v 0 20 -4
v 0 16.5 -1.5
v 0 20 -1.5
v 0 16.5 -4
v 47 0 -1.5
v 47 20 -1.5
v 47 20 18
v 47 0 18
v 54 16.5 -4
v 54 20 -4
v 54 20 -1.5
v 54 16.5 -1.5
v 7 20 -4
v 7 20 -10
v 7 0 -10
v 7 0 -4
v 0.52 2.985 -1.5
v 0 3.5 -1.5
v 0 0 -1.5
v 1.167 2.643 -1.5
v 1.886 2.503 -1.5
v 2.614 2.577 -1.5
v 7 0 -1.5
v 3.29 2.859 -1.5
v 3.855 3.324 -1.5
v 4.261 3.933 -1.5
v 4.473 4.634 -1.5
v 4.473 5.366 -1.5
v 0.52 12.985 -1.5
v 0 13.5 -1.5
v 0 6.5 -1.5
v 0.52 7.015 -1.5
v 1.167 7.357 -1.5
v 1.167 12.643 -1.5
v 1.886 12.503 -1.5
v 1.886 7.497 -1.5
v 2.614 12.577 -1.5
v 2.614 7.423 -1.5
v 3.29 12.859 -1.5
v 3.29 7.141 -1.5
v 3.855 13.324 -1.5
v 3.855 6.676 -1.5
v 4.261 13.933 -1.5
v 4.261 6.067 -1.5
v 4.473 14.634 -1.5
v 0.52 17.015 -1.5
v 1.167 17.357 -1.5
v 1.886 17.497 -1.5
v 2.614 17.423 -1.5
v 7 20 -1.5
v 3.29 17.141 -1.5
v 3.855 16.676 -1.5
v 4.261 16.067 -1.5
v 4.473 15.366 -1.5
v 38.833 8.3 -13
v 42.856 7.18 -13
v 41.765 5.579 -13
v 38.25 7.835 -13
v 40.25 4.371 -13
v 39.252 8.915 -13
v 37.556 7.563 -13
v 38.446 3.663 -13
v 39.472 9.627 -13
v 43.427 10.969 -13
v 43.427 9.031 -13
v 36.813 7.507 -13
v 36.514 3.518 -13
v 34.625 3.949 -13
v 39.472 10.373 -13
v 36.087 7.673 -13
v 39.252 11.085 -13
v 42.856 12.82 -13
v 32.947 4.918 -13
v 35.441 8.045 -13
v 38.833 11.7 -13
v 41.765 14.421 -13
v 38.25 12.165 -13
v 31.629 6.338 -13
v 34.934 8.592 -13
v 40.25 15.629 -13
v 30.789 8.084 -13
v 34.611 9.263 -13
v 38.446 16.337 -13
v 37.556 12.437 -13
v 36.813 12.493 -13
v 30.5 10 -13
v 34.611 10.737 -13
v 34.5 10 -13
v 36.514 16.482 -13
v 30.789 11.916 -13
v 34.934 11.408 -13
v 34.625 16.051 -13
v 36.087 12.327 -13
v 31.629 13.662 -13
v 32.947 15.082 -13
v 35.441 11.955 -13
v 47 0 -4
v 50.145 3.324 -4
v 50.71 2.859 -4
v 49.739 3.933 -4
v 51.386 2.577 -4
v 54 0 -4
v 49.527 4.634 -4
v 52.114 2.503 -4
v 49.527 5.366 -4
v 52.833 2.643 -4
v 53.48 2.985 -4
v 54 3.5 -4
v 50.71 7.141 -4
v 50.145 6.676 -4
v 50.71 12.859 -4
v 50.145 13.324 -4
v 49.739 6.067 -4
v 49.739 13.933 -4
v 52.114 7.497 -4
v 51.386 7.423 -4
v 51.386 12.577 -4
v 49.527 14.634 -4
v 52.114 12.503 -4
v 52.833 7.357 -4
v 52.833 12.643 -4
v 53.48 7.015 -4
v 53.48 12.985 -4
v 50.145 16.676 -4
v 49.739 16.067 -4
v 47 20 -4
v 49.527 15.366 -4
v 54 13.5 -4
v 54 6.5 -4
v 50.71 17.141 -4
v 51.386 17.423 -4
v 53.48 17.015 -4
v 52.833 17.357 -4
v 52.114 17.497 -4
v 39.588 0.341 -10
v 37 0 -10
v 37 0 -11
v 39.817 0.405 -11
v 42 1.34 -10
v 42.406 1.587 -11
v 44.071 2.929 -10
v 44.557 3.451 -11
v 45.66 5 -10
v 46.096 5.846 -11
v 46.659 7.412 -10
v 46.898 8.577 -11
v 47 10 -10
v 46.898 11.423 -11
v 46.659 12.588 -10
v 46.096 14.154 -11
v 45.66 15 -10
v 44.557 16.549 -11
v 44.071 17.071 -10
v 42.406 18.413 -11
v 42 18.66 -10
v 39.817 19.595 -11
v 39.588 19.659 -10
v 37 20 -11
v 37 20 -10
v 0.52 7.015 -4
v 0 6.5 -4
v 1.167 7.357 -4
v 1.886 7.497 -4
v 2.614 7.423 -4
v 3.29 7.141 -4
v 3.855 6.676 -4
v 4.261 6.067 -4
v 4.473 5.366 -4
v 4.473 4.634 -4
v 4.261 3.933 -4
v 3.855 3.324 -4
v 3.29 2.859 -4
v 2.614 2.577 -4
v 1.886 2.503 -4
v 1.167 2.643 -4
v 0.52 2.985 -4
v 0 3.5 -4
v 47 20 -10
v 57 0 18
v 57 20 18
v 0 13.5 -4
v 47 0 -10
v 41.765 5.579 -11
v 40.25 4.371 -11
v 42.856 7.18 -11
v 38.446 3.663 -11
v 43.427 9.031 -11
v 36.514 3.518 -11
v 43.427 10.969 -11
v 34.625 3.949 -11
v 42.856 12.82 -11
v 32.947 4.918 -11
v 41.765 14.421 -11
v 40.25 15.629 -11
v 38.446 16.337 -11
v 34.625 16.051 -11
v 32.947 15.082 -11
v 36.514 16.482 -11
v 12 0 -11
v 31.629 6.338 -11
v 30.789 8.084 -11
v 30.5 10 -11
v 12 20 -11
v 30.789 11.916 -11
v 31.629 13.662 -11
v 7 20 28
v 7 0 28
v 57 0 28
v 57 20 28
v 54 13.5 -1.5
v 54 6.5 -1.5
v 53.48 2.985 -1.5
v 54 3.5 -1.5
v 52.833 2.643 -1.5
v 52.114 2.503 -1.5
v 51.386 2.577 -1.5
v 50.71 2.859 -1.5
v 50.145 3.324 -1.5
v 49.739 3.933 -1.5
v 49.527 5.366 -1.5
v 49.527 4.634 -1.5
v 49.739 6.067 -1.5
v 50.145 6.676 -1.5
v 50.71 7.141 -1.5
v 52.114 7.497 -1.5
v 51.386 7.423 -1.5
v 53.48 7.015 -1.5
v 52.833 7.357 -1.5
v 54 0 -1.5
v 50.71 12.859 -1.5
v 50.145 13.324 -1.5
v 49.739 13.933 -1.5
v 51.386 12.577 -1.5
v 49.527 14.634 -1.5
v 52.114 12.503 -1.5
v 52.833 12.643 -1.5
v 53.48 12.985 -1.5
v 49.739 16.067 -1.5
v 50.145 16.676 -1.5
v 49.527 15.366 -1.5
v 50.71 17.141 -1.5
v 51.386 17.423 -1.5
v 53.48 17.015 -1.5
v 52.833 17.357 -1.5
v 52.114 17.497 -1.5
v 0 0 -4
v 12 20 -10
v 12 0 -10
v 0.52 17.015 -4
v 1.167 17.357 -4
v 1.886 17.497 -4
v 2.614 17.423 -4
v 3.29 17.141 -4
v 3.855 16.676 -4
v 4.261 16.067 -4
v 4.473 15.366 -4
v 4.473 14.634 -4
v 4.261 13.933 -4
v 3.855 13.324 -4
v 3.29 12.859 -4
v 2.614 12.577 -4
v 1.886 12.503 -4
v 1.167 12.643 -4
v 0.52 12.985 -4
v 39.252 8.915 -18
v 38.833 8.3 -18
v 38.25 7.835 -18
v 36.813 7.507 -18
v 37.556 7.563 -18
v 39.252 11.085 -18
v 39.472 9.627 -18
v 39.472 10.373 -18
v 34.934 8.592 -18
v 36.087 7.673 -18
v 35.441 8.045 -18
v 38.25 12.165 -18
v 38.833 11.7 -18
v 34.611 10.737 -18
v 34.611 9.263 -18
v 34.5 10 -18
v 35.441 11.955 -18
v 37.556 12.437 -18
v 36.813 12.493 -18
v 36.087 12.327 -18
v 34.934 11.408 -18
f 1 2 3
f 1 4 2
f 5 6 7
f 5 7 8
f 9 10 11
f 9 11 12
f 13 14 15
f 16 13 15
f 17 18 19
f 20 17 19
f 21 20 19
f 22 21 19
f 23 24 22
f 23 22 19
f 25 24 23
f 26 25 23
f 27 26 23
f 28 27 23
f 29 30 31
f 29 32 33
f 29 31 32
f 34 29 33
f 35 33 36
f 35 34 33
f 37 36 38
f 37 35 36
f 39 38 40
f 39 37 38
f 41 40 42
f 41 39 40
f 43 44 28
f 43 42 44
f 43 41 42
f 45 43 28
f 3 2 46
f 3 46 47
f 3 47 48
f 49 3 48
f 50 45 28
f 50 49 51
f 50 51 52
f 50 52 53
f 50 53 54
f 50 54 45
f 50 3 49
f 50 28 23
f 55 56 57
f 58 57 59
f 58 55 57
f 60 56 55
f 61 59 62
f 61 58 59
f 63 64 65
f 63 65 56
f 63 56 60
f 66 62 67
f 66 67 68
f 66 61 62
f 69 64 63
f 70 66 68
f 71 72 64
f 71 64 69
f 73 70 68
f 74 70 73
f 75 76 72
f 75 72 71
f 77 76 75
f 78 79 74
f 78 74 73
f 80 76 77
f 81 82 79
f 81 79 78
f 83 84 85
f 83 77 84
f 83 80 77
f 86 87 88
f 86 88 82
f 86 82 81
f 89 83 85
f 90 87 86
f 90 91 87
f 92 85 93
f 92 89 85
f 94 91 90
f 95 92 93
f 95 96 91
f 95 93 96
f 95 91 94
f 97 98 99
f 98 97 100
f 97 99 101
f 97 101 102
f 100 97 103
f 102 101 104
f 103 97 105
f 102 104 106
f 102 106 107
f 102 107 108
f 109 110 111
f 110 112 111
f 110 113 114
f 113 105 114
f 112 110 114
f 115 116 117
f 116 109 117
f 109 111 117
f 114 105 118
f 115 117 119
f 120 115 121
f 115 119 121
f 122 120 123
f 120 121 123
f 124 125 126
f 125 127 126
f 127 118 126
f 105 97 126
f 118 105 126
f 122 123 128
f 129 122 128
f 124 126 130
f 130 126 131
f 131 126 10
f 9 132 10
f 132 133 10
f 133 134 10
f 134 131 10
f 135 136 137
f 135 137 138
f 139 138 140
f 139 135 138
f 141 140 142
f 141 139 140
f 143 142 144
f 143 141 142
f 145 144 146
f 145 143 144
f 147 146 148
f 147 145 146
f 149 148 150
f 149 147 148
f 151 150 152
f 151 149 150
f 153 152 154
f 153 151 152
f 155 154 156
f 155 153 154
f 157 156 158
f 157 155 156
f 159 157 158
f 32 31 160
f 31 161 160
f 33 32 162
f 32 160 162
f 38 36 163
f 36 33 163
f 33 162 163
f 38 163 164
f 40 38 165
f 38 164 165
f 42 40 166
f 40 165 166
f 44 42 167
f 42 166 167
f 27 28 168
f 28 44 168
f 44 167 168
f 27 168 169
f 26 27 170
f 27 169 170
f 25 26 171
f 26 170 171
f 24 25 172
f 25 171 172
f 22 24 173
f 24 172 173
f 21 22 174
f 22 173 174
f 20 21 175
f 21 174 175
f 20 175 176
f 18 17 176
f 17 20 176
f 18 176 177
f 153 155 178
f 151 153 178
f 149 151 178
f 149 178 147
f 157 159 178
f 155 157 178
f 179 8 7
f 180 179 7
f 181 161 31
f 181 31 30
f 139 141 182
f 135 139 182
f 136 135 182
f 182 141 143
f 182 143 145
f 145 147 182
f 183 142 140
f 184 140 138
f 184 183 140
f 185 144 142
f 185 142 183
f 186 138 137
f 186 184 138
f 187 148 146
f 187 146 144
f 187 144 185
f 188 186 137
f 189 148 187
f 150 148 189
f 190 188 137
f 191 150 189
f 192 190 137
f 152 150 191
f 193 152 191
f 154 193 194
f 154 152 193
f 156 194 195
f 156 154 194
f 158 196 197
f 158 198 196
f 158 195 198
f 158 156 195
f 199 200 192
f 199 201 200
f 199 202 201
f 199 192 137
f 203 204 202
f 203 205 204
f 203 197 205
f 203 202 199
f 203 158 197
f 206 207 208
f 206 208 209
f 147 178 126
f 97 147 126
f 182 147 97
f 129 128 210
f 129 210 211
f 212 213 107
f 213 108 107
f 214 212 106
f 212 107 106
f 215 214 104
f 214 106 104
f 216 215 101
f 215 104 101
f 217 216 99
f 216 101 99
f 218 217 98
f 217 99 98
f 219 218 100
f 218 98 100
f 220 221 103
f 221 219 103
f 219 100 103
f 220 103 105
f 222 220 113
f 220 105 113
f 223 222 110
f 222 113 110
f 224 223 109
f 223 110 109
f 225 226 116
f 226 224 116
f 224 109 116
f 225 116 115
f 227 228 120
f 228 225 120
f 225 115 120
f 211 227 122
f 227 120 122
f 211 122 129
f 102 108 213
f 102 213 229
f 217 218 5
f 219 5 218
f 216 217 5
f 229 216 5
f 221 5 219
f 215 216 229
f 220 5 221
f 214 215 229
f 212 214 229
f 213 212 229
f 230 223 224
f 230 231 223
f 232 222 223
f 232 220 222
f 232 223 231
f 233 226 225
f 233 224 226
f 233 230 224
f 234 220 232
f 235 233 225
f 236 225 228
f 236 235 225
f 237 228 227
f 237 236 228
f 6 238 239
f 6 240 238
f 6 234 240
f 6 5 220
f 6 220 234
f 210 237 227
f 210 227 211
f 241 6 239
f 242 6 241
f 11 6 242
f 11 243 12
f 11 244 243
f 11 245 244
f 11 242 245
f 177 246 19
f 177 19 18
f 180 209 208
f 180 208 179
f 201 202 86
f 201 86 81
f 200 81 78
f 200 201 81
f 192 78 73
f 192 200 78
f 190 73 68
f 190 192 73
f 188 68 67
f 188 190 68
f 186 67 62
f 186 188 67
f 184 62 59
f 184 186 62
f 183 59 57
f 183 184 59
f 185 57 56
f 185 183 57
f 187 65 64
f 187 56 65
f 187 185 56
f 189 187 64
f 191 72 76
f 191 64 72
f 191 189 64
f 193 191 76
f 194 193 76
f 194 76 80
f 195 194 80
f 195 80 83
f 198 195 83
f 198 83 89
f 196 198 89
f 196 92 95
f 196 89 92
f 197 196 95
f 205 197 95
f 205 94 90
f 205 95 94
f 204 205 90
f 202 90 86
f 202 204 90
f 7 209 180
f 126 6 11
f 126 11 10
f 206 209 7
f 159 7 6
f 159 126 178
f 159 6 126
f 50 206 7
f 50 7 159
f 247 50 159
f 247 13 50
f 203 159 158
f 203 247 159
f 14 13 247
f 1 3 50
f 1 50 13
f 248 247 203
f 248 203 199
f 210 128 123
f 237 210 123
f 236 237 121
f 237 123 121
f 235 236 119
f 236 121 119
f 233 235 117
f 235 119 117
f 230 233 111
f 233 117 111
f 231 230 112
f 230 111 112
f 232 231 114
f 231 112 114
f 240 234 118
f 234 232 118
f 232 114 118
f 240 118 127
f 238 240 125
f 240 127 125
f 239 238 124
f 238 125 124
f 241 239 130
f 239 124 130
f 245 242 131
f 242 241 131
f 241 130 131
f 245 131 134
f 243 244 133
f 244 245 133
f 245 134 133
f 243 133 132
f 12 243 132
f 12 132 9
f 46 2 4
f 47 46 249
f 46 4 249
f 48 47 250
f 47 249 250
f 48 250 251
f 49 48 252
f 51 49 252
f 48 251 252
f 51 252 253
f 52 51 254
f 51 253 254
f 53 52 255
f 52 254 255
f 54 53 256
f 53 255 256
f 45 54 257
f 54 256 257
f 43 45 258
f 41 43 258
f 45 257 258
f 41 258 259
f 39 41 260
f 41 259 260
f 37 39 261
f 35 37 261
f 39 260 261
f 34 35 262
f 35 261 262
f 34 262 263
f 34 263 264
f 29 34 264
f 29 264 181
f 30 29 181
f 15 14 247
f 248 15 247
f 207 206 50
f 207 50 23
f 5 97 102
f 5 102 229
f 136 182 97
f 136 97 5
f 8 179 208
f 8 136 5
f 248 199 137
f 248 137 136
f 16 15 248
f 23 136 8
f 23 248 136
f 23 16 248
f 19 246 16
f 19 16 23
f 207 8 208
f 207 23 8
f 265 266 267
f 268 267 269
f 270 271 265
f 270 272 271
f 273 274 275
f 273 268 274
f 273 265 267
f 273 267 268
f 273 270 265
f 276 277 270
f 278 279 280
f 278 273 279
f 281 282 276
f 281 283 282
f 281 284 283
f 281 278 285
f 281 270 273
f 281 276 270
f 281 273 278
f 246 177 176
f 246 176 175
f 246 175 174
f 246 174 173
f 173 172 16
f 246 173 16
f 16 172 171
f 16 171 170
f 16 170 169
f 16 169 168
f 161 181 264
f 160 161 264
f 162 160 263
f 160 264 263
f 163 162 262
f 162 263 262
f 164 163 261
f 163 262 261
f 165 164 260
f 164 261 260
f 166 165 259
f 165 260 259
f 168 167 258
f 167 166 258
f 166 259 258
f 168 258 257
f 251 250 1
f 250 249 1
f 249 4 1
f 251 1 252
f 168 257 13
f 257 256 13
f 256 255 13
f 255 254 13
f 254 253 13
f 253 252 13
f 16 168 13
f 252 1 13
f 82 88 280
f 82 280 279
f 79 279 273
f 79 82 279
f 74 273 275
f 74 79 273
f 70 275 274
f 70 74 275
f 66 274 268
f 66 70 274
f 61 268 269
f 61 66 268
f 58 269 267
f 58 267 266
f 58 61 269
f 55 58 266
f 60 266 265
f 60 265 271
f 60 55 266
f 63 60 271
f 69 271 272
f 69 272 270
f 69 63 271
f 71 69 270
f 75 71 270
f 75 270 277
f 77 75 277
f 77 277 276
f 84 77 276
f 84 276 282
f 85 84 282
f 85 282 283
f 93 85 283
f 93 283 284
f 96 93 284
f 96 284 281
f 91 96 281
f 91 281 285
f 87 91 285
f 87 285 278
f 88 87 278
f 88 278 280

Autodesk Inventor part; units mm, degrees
ref_plane "YZ Plane" through (0, 0, 0) normal (1, 0, 0) x (0, 1, 0)
ref_plane "XZ Plane" through (0, 0, 0) normal (0, 1, 0) x (-1, 0, 0)
sketch "Sketch1" plane through (0, 0, 0) normal (0, 0, 1) x (1, 0, 0)
  line L0 (7, 0) -> (47, 0)
  line L1 (47, 20) -> (7, 20)
  line L2 (7, 20) -> (7, 0)
  line L3 (47, 20) -> (47, 0)
  point P0 (0, 0)
extrude "Extrusion1" add sketch "Sketch1" along normal blind 28 and the other way blind 10
sketch "Sketch2" plane through (0, 0, -10) normal (0, 0, -1) x (-1, 0, 0)
  line L0 (-7, 20) -> (-47, 20) projected
  line L1 (-47, 20) -> (-47, 10)
  line L2 (-47, 20) -> (-47, 0) projected
  line L3 (-47, 10) -> (-37, 10)
  circle A0 centre (-37, 10) radius 2.5
  point P0 (0, 0)
  dimension "d10" = 10
  dimension "d11" = 10
  dimension "d12" = 5
extrude "Extrusion3" add sketch "Sketch2" along normal blind 8
sketch "Sketch3" plane through (0, 0, -10) normal (0, 0, -1) x (-1, 0, 0)
  circle A0 centre (-37, 10) radius 2.5 projected
  circle A1 centre (-37, 10) radius 10
  line L0 (-47, 20) -> (-7, 20) projected
  line L1 (-7, 20) -> (0, 20) projected
  line L2 (-7, 20) -> (-12, 20)
  line L3 (-7, 20) -> (-47, 20) projected
  line L4 (-12, 20) -> (-12, 0)
  line L5 (-7, 0) -> (-47, 0) projected
  line L6 (-47, 0) -> (-7, 0) projected
  point P0 (0, 0)
  point P1 (-37, 0)
  point P2 (-37, 20)
  dimension "d15" = 5
extrude "Extrusion4" add sketch "Sketch3" along normal blind 1
ref_plane "Work Plane1" through (0, 0, -4) normal (0, 0, 1) x (1, 0, 0)
sketch "Sketch4" plane through (0, 0, -4) normal (0, 0, 1) x (1, 0, 0)
  line L0 (47, 0) -> (47, 20) projected
  line L1 (47, 20) -> (54, 20)
  line L2 (54, 0) -> (47, 0)
  line L3 (47, 20) -> (7, 20) projected
  line L4 (47, 0) -> (47, 20)
  line L5 (7, 20) -> (7, 0) projected
  line L6 (7, 0) -> (0, 0)
  line L7 (0, 20) -> (7, 20)
  line L8 (7, 10) -> (7, 15)
  line L9 (7, 15) -> (2, 15)
  arc A0 (0, 13.5) -> (0, 16.5) centre (2, 15) ccw
  line L10 (27, 10) -> (22.2315, 10)
  line L11 (47, 20) -> (47, 10) projected
  line L12 (47, 20) -> (27, 20)
  line L13 (27, 20) -> (27, 13.3752)
  arc A1 (0, 3.5) -> (0, 6.5) centre (2, 5) ccw
  arc A2 (54, 16.5) -> (54, 13.5) centre (52, 15) ccw
  arc A3 (54, 6.5) -> (54, 3.5) centre (52, 5) ccw
  line L14 (54, 20) -> (54, 16.5)
  line L15 (54, 13.5) -> (54, 6.5)
  line L16 (54, 3.5) -> (54, 0)
  line L17 (0, 0) -> (0, 3.5)
  line L18 (0, 6.5) -> (0, 13.5)
  line L19 (0, 16.5) -> (0, 20)
  dimension "d19" = 7
  dimension "d21" = 7
  dimension "d22" = 5
  dimension "d23" = 5
  dimension "d24" = 5
  dimension "d25" = 20
extrude "Extrusion5" add sketch "Sketch4" along normal blind 2.5
sketch "Sketch5" plane through (0, 0, -11) normal (0, 0, -1) x (-1, 0, 0)
  circle A0 centre (-37, 10) radius 2.5 projected
  circle A1 centre (-37, 10) radius 2.5 projected
  circle A2 centre (-37, 10) radius 6.5
  point P0 (0, 0)
  dimension "d28" = 13
extrude "Extrusion6" add sketch "Sketch5" along normal blind 2
sketch "Sketch6" plane through (47, 0, 28) normal (1, 0, 0) x (0, 0, -1)
  line L0 (29.5, 0) -> (0, 0) projected
  line L1 (0, 0) -> (10, 0)
  line L2 (10, 0) -> (10, 20)
  line L3 (0, 20) -> (29.5, 20) projected
  line L4 (0, 20) -> (10, 20)
  line L5 (0, 0) -> (0, 20) projected
  point P0 (28, 0)
  dimension "d31" = 10
extrude "Extrusion7" add sketch "Sketch6" along normal blind 10
properties part number "Motorv2"
